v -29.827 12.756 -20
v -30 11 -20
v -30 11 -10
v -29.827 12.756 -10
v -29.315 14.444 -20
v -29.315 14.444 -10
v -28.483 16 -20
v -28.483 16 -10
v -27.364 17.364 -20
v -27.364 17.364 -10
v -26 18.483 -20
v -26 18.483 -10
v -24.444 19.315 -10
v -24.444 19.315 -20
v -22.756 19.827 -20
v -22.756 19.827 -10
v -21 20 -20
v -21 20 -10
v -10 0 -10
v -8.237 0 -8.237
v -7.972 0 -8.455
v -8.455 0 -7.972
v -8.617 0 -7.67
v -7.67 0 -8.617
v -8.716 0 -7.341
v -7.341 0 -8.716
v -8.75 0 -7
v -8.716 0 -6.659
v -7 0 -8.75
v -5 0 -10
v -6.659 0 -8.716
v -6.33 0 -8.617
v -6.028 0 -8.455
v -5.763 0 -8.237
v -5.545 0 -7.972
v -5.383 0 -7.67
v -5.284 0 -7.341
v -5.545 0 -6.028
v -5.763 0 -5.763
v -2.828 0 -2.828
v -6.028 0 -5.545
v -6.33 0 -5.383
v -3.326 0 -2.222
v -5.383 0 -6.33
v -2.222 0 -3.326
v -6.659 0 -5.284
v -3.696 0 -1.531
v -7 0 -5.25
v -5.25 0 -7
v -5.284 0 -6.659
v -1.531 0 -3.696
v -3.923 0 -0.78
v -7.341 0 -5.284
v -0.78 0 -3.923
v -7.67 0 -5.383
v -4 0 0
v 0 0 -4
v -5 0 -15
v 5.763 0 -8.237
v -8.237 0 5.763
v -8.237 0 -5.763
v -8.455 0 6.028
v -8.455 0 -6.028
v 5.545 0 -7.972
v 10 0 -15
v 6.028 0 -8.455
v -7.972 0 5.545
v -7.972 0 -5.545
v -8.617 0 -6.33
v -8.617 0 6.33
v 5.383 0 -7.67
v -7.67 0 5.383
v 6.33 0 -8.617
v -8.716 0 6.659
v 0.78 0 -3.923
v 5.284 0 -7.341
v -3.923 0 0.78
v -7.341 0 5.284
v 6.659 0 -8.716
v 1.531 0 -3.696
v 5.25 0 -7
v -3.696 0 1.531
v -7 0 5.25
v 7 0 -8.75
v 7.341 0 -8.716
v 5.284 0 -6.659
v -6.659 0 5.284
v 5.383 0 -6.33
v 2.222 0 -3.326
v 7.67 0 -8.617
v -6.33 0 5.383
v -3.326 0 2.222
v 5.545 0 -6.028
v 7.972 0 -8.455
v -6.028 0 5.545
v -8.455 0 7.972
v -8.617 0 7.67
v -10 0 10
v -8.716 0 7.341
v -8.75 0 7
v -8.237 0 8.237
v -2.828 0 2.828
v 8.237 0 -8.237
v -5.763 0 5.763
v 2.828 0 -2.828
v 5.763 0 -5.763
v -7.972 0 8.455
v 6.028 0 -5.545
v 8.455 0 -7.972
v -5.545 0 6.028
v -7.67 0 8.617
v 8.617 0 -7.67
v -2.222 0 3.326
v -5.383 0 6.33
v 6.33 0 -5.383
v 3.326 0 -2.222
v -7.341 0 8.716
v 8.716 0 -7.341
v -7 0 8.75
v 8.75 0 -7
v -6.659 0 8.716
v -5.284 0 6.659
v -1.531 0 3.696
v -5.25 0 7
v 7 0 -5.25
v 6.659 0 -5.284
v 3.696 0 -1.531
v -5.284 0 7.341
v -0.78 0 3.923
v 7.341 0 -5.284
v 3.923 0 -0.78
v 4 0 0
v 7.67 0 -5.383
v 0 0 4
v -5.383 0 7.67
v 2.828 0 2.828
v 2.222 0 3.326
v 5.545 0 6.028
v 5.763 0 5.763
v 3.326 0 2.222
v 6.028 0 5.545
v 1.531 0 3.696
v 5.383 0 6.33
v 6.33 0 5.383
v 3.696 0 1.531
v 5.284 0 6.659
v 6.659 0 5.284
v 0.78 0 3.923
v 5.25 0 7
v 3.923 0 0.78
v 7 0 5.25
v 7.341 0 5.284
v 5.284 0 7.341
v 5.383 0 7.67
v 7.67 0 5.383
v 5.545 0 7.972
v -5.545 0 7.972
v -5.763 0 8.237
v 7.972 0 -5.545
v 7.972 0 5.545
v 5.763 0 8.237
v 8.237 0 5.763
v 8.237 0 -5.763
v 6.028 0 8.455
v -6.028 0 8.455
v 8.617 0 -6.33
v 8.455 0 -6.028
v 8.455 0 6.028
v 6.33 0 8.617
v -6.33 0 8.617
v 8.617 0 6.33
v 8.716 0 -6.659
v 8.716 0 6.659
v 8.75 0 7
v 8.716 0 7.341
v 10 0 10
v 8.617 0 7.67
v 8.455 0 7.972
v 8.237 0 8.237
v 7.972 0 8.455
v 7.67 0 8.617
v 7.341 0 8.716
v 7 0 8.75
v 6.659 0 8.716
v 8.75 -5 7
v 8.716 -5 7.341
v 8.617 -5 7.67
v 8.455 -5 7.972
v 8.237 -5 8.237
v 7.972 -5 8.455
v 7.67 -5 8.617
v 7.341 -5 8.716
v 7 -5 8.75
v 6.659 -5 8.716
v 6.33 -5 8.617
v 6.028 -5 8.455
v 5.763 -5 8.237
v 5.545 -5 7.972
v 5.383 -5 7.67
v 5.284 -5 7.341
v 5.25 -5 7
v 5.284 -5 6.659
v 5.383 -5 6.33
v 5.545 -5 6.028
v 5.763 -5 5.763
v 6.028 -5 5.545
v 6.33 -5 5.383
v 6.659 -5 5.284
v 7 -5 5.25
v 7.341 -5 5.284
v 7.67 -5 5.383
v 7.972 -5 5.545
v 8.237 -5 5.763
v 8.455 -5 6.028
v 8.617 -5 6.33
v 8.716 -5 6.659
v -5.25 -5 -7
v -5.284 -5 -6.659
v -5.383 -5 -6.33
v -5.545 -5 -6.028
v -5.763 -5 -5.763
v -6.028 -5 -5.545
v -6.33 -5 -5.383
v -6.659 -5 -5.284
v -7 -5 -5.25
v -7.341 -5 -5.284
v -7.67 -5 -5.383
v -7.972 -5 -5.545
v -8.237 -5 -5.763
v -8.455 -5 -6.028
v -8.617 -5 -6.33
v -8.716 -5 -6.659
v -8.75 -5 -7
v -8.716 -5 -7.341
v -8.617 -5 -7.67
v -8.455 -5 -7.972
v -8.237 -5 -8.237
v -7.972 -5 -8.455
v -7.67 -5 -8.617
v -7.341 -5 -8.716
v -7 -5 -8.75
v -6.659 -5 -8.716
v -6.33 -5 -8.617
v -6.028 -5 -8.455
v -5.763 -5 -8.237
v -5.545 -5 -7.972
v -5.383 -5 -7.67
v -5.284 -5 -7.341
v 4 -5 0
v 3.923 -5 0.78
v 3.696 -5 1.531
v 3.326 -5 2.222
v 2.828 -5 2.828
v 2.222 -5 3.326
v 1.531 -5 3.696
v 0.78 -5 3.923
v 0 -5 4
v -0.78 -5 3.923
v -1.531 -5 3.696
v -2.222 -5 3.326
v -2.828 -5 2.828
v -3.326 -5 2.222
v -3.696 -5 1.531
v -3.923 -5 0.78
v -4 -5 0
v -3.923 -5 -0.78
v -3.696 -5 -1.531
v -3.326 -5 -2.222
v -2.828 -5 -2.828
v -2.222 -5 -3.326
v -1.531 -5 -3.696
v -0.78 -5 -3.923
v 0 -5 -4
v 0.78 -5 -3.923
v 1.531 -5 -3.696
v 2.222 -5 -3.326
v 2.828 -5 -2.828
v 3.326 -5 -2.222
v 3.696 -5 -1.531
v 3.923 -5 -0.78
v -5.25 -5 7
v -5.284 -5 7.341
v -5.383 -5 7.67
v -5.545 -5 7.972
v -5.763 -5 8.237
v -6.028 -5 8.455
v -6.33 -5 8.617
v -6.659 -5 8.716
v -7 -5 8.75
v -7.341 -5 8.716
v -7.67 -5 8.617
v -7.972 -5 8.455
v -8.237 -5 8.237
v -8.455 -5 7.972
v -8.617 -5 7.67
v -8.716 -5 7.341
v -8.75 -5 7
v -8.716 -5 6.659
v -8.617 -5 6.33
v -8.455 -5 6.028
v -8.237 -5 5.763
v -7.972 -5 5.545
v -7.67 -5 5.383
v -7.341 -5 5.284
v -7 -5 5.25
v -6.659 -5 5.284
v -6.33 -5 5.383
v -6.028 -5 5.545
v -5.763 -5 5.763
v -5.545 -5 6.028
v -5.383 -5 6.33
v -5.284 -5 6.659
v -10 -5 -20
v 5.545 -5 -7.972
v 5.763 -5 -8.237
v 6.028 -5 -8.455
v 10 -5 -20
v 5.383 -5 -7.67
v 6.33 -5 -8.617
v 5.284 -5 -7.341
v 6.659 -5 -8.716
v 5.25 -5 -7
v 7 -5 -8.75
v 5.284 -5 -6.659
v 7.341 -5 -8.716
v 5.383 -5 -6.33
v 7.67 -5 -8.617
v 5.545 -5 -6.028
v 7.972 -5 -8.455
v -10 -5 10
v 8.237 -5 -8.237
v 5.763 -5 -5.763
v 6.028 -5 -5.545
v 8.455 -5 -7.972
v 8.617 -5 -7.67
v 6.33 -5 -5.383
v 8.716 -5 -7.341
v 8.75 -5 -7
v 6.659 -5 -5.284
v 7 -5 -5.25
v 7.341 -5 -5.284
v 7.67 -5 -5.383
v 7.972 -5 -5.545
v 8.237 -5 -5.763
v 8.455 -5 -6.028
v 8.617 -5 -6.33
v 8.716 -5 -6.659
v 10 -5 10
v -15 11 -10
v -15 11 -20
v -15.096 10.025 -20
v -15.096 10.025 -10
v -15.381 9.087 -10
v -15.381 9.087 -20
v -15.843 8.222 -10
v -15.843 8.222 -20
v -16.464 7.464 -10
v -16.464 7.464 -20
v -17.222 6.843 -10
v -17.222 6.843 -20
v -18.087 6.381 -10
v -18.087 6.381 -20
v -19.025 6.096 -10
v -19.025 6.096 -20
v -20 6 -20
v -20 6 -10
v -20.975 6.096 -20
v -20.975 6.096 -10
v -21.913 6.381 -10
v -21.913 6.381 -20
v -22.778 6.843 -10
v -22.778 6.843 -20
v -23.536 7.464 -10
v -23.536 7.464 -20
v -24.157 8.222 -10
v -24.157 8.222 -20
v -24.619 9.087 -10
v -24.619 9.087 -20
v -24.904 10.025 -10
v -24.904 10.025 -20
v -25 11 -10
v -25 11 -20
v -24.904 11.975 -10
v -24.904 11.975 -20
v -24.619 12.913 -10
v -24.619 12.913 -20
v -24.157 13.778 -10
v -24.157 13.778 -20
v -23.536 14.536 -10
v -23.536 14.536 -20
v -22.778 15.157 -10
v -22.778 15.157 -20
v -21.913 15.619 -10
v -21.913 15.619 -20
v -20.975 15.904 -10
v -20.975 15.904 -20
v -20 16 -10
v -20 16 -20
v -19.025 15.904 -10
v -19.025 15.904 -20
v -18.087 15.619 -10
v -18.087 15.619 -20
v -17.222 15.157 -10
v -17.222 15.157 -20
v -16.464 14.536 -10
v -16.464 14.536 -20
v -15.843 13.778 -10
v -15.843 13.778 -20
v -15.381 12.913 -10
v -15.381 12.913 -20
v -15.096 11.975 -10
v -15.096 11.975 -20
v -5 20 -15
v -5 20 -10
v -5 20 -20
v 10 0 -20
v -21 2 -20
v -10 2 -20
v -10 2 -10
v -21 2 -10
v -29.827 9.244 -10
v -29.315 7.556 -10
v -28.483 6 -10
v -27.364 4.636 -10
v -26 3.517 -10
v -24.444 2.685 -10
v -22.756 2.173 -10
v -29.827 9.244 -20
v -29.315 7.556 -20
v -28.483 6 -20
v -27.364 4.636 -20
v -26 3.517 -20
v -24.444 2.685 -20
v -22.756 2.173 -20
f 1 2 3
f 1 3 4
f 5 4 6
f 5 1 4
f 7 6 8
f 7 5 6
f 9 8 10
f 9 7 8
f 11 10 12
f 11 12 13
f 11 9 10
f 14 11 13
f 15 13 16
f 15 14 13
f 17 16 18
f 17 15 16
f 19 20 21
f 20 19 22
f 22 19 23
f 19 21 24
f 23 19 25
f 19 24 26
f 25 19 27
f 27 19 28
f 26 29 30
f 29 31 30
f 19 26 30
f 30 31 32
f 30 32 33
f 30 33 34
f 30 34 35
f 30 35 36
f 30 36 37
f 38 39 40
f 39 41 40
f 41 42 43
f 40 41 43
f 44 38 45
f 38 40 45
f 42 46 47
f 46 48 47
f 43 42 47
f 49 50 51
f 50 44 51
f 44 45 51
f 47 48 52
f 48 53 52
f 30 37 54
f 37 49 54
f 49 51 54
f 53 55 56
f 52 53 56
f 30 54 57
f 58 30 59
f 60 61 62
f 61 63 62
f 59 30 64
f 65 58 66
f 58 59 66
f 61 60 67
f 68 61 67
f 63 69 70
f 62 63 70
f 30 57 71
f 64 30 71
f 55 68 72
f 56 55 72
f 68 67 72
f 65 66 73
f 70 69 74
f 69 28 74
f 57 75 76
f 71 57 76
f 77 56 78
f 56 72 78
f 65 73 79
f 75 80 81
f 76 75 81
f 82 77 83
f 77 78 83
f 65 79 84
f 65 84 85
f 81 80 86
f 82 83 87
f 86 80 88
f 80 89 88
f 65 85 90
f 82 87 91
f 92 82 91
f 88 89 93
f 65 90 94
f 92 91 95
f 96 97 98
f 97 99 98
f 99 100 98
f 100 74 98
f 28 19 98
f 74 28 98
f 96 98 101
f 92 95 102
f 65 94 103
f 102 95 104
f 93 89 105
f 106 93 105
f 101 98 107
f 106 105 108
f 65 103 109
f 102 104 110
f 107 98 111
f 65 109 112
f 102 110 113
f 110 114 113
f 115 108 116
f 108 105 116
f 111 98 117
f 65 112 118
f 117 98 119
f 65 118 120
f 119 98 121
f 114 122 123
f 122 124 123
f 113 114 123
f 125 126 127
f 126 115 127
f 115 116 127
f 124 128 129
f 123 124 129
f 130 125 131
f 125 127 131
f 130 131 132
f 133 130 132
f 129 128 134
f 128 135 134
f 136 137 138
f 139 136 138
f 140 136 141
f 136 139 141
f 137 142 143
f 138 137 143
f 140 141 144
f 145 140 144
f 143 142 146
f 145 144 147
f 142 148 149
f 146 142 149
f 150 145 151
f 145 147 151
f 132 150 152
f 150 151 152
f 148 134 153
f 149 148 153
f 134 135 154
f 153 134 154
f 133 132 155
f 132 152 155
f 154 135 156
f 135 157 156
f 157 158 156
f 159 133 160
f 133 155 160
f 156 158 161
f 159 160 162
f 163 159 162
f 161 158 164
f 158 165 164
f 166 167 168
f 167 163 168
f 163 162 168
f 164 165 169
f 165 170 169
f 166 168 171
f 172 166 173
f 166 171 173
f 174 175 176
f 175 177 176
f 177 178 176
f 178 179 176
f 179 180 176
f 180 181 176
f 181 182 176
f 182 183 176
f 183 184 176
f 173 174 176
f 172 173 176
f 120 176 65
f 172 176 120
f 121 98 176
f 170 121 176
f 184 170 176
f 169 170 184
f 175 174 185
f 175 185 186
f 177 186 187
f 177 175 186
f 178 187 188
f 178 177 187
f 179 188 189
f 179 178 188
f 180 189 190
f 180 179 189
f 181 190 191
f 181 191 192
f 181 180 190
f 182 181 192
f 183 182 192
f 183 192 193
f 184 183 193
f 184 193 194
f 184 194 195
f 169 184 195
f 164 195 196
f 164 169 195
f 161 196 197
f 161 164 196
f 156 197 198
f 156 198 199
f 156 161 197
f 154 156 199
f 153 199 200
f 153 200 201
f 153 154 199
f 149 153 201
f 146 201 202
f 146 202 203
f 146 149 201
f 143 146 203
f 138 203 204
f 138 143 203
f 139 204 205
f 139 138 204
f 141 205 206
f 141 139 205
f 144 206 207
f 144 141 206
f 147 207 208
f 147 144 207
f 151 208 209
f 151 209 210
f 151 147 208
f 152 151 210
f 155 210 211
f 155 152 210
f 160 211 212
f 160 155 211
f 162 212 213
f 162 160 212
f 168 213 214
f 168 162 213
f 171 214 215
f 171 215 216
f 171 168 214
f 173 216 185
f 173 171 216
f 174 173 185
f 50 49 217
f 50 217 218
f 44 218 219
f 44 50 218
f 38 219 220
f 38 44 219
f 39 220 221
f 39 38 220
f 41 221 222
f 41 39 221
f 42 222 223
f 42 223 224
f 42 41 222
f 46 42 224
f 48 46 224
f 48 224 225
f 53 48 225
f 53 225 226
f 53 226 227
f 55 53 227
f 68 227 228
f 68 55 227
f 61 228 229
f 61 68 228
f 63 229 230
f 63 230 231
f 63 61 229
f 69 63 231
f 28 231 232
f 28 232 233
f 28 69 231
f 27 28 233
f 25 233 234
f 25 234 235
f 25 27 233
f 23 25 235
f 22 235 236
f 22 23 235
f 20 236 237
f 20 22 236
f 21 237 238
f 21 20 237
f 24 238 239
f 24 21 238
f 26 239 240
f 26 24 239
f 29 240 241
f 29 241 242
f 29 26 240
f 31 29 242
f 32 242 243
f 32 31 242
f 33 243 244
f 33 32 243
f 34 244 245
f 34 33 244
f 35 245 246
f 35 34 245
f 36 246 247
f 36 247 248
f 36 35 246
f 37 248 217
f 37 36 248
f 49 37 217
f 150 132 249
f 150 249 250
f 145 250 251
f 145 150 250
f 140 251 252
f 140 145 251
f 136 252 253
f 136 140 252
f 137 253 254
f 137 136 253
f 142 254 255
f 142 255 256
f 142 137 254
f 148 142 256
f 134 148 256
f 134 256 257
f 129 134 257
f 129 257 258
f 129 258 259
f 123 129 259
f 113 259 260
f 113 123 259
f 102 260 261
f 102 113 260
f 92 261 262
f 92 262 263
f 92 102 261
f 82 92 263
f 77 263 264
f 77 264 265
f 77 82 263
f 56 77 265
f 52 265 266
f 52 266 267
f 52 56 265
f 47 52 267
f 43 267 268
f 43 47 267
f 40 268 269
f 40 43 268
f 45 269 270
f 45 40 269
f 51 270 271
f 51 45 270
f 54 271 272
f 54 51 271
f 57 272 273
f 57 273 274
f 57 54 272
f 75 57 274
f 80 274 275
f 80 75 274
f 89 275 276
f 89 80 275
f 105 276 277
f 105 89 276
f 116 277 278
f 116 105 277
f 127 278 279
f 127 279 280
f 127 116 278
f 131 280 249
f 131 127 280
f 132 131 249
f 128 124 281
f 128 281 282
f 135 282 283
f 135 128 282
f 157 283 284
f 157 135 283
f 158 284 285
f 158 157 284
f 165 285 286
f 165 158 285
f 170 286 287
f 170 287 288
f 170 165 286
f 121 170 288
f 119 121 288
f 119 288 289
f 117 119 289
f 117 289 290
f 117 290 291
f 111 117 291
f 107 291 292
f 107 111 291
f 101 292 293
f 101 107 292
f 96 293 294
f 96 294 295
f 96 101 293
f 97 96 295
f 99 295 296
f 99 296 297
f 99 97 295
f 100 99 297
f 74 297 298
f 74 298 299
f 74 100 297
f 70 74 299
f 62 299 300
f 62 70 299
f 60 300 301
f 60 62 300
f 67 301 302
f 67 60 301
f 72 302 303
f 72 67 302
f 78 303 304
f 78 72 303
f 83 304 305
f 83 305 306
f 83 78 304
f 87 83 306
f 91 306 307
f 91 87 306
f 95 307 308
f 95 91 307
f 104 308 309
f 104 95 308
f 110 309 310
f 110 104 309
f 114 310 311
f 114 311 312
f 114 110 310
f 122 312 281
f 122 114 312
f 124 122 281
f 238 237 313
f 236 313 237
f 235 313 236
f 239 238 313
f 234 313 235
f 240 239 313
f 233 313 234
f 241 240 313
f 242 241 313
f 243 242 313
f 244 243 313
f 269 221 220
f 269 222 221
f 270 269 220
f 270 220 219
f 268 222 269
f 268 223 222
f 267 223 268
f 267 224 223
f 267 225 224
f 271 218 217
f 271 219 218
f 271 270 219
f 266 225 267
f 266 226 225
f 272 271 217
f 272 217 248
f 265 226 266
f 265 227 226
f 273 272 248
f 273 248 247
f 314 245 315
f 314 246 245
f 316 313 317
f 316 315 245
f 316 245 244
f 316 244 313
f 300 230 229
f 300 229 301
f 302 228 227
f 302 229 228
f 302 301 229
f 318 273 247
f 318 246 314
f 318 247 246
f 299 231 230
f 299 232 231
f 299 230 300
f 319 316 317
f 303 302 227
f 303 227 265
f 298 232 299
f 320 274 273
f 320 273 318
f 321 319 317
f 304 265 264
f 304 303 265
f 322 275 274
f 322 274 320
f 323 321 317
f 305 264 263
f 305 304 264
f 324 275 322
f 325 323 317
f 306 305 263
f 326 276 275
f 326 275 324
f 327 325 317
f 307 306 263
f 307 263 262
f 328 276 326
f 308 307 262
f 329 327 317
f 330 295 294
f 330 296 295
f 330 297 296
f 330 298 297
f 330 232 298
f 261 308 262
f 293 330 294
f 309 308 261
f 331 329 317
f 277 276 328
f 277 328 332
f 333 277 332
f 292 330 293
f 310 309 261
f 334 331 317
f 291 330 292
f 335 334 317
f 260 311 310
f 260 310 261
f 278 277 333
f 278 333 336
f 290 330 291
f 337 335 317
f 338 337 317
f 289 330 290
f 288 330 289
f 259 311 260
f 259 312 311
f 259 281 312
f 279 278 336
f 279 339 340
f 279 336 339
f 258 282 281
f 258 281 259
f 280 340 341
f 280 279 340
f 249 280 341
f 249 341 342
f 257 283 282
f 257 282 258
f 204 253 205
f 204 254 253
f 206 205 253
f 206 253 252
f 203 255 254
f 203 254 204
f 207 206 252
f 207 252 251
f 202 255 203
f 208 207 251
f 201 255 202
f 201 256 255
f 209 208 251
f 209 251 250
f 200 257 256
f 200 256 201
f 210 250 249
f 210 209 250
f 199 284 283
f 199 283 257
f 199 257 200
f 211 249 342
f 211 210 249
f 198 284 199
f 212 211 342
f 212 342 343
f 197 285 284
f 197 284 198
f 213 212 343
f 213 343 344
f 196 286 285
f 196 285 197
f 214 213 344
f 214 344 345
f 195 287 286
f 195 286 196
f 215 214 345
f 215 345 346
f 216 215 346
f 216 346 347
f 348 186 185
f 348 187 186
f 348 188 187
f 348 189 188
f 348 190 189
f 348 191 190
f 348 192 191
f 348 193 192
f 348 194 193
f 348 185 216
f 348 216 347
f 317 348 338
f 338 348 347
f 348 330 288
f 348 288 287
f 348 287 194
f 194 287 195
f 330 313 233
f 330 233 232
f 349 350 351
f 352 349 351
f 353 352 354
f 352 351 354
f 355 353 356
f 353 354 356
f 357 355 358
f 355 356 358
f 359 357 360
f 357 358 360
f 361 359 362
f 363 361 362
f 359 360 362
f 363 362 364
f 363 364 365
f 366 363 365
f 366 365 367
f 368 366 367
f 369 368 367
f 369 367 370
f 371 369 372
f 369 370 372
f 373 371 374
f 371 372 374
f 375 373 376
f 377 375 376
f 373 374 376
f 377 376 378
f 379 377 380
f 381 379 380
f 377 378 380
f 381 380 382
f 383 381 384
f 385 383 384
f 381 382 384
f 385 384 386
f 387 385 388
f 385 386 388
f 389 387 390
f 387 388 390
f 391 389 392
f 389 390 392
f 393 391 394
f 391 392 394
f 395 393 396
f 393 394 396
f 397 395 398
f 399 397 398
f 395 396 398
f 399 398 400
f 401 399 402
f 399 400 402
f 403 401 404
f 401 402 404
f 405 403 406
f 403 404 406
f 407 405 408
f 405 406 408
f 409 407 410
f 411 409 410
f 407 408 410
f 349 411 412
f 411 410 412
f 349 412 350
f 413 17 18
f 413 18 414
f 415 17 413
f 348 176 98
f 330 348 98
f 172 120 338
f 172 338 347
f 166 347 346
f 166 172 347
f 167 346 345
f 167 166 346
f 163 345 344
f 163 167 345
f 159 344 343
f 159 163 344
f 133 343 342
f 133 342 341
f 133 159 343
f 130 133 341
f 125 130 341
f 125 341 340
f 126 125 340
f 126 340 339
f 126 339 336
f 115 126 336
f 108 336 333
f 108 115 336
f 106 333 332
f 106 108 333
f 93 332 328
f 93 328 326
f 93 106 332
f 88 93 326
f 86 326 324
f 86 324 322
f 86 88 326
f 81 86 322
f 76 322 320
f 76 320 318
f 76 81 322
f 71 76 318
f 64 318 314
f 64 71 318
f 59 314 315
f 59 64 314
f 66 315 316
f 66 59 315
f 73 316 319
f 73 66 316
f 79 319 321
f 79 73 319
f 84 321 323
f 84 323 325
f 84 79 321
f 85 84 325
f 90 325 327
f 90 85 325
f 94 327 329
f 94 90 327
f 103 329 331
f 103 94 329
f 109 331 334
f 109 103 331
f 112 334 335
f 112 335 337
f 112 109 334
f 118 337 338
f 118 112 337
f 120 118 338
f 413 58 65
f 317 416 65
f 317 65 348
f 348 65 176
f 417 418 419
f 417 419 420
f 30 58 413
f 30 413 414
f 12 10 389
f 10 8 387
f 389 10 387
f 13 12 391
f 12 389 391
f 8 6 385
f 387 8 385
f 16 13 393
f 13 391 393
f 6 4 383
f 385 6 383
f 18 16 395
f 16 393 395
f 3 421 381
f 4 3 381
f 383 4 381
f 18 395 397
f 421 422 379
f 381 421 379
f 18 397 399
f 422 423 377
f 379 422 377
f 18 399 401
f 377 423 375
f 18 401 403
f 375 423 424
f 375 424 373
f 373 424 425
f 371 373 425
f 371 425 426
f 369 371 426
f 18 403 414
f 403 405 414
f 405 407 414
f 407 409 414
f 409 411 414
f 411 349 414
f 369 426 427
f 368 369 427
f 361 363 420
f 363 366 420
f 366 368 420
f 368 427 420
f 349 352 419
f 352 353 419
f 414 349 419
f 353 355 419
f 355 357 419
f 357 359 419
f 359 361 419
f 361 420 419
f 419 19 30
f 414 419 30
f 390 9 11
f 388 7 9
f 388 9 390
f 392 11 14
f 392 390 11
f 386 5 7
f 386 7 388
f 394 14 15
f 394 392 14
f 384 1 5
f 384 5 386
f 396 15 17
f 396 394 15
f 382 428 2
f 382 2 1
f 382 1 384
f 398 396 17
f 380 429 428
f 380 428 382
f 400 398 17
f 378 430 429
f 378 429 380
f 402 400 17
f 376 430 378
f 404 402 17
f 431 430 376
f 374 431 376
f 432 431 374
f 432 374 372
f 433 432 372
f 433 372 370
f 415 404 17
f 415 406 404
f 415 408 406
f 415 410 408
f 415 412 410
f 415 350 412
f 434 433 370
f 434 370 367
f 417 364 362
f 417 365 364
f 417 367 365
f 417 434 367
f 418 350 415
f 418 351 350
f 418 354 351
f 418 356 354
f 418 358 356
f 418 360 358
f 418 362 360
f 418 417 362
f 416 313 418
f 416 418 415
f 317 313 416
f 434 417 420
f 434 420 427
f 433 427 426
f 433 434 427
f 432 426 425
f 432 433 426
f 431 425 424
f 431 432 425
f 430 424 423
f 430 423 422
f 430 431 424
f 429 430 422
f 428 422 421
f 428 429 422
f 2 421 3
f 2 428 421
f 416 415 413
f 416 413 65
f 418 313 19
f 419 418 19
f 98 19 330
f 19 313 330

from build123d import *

# Parameters (mm, degrees)
F0_R          = 1.75
F0_R_2        = 4
F0_W          = 5
F0_H          = 10
F1_DEPTH      = 5
F2_DEPTH      = 5
F2_DEPTH_BACK = 20
F3_R          = 5
F4_DEPTH      = 10
F6_DEPTH      = 5


with BuildPart() as f1:
    # F0 (on Front) → F1 (new body)
    with BuildSketch(Plane.XZ):
        Polygon((10, -10), (10, 10), (-10, 10), (-10, -10), (-5, -10), (-5, -20), (5, -20), (5, -10), align=None)
        with Locations((-7, -7)):
            Circle(F0_R, mode=Mode.SUBTRACT)
        with Locations((7, -7)):
            Circle(F0_R, mode=Mode.SUBTRACT)
        with Locations((-7, 7)):
            Circle(F0_R, mode=Mode.SUBTRACT)
        Circle(F0_R_2, mode=Mode.SUBTRACT)
        with Locations((7, 7)):
            Circle(F0_R, mode=Mode.SUBTRACT)
        with Locations((7.5, -15)):
            Rectangle(F0_W, F0_H)
    extrude(amount=F1_DEPTH)

    # F0 (on Front) → F2 (join, two sides)
    with BuildSketch(Plane.XZ) as f2_sk:
        with Locations((-7.5, -15)):
            Rectangle(F0_W, F0_H)
    extrude(amount=F2_DEPTH)
    extrude(f2_sk.sketch, amount=-F2_DEPTH_BACK)

    # F3 (on face) → F4 (join)
    with BuildSketch(Plane(origin=(0, 0, -20), x_dir=(1, 0, 0), z_dir=(0, 0, -1))):
        with BuildLine():
            Line((-21, -20), (-10, -20))
            Line((-10, -20), (-10, -2))
            Line((-10, -2), (-21, -2))
            ThreePointArc((-21, -2), (-27.3639610307, -4.6360389693), (-30, -11))
            ThreePointArc((-30, -11), (-27.3639610307, -17.3639610307), (-21, -20))
        make_face()
        with Locations((-20, -11)):
            Circle(F3_R, mode=Mode.SUBTRACT)
    extrude(amount=-F4_DEPTH)

    # F5 (on face) → F6 (join)
    with BuildSketch(Plane(origin=(0, 0, -20), x_dir=(1, 0, 0), z_dir=(0, 0, -1))):
        Polygon((-10, 5), (-10, 0), (-5, 0), (10, 0), (10, 5), align=None)
        Polygon((10, 0), (-5, 0), (-5, -20), align=None)
    extrude(amount=-F6_DEPTH)


solid = f1.part
